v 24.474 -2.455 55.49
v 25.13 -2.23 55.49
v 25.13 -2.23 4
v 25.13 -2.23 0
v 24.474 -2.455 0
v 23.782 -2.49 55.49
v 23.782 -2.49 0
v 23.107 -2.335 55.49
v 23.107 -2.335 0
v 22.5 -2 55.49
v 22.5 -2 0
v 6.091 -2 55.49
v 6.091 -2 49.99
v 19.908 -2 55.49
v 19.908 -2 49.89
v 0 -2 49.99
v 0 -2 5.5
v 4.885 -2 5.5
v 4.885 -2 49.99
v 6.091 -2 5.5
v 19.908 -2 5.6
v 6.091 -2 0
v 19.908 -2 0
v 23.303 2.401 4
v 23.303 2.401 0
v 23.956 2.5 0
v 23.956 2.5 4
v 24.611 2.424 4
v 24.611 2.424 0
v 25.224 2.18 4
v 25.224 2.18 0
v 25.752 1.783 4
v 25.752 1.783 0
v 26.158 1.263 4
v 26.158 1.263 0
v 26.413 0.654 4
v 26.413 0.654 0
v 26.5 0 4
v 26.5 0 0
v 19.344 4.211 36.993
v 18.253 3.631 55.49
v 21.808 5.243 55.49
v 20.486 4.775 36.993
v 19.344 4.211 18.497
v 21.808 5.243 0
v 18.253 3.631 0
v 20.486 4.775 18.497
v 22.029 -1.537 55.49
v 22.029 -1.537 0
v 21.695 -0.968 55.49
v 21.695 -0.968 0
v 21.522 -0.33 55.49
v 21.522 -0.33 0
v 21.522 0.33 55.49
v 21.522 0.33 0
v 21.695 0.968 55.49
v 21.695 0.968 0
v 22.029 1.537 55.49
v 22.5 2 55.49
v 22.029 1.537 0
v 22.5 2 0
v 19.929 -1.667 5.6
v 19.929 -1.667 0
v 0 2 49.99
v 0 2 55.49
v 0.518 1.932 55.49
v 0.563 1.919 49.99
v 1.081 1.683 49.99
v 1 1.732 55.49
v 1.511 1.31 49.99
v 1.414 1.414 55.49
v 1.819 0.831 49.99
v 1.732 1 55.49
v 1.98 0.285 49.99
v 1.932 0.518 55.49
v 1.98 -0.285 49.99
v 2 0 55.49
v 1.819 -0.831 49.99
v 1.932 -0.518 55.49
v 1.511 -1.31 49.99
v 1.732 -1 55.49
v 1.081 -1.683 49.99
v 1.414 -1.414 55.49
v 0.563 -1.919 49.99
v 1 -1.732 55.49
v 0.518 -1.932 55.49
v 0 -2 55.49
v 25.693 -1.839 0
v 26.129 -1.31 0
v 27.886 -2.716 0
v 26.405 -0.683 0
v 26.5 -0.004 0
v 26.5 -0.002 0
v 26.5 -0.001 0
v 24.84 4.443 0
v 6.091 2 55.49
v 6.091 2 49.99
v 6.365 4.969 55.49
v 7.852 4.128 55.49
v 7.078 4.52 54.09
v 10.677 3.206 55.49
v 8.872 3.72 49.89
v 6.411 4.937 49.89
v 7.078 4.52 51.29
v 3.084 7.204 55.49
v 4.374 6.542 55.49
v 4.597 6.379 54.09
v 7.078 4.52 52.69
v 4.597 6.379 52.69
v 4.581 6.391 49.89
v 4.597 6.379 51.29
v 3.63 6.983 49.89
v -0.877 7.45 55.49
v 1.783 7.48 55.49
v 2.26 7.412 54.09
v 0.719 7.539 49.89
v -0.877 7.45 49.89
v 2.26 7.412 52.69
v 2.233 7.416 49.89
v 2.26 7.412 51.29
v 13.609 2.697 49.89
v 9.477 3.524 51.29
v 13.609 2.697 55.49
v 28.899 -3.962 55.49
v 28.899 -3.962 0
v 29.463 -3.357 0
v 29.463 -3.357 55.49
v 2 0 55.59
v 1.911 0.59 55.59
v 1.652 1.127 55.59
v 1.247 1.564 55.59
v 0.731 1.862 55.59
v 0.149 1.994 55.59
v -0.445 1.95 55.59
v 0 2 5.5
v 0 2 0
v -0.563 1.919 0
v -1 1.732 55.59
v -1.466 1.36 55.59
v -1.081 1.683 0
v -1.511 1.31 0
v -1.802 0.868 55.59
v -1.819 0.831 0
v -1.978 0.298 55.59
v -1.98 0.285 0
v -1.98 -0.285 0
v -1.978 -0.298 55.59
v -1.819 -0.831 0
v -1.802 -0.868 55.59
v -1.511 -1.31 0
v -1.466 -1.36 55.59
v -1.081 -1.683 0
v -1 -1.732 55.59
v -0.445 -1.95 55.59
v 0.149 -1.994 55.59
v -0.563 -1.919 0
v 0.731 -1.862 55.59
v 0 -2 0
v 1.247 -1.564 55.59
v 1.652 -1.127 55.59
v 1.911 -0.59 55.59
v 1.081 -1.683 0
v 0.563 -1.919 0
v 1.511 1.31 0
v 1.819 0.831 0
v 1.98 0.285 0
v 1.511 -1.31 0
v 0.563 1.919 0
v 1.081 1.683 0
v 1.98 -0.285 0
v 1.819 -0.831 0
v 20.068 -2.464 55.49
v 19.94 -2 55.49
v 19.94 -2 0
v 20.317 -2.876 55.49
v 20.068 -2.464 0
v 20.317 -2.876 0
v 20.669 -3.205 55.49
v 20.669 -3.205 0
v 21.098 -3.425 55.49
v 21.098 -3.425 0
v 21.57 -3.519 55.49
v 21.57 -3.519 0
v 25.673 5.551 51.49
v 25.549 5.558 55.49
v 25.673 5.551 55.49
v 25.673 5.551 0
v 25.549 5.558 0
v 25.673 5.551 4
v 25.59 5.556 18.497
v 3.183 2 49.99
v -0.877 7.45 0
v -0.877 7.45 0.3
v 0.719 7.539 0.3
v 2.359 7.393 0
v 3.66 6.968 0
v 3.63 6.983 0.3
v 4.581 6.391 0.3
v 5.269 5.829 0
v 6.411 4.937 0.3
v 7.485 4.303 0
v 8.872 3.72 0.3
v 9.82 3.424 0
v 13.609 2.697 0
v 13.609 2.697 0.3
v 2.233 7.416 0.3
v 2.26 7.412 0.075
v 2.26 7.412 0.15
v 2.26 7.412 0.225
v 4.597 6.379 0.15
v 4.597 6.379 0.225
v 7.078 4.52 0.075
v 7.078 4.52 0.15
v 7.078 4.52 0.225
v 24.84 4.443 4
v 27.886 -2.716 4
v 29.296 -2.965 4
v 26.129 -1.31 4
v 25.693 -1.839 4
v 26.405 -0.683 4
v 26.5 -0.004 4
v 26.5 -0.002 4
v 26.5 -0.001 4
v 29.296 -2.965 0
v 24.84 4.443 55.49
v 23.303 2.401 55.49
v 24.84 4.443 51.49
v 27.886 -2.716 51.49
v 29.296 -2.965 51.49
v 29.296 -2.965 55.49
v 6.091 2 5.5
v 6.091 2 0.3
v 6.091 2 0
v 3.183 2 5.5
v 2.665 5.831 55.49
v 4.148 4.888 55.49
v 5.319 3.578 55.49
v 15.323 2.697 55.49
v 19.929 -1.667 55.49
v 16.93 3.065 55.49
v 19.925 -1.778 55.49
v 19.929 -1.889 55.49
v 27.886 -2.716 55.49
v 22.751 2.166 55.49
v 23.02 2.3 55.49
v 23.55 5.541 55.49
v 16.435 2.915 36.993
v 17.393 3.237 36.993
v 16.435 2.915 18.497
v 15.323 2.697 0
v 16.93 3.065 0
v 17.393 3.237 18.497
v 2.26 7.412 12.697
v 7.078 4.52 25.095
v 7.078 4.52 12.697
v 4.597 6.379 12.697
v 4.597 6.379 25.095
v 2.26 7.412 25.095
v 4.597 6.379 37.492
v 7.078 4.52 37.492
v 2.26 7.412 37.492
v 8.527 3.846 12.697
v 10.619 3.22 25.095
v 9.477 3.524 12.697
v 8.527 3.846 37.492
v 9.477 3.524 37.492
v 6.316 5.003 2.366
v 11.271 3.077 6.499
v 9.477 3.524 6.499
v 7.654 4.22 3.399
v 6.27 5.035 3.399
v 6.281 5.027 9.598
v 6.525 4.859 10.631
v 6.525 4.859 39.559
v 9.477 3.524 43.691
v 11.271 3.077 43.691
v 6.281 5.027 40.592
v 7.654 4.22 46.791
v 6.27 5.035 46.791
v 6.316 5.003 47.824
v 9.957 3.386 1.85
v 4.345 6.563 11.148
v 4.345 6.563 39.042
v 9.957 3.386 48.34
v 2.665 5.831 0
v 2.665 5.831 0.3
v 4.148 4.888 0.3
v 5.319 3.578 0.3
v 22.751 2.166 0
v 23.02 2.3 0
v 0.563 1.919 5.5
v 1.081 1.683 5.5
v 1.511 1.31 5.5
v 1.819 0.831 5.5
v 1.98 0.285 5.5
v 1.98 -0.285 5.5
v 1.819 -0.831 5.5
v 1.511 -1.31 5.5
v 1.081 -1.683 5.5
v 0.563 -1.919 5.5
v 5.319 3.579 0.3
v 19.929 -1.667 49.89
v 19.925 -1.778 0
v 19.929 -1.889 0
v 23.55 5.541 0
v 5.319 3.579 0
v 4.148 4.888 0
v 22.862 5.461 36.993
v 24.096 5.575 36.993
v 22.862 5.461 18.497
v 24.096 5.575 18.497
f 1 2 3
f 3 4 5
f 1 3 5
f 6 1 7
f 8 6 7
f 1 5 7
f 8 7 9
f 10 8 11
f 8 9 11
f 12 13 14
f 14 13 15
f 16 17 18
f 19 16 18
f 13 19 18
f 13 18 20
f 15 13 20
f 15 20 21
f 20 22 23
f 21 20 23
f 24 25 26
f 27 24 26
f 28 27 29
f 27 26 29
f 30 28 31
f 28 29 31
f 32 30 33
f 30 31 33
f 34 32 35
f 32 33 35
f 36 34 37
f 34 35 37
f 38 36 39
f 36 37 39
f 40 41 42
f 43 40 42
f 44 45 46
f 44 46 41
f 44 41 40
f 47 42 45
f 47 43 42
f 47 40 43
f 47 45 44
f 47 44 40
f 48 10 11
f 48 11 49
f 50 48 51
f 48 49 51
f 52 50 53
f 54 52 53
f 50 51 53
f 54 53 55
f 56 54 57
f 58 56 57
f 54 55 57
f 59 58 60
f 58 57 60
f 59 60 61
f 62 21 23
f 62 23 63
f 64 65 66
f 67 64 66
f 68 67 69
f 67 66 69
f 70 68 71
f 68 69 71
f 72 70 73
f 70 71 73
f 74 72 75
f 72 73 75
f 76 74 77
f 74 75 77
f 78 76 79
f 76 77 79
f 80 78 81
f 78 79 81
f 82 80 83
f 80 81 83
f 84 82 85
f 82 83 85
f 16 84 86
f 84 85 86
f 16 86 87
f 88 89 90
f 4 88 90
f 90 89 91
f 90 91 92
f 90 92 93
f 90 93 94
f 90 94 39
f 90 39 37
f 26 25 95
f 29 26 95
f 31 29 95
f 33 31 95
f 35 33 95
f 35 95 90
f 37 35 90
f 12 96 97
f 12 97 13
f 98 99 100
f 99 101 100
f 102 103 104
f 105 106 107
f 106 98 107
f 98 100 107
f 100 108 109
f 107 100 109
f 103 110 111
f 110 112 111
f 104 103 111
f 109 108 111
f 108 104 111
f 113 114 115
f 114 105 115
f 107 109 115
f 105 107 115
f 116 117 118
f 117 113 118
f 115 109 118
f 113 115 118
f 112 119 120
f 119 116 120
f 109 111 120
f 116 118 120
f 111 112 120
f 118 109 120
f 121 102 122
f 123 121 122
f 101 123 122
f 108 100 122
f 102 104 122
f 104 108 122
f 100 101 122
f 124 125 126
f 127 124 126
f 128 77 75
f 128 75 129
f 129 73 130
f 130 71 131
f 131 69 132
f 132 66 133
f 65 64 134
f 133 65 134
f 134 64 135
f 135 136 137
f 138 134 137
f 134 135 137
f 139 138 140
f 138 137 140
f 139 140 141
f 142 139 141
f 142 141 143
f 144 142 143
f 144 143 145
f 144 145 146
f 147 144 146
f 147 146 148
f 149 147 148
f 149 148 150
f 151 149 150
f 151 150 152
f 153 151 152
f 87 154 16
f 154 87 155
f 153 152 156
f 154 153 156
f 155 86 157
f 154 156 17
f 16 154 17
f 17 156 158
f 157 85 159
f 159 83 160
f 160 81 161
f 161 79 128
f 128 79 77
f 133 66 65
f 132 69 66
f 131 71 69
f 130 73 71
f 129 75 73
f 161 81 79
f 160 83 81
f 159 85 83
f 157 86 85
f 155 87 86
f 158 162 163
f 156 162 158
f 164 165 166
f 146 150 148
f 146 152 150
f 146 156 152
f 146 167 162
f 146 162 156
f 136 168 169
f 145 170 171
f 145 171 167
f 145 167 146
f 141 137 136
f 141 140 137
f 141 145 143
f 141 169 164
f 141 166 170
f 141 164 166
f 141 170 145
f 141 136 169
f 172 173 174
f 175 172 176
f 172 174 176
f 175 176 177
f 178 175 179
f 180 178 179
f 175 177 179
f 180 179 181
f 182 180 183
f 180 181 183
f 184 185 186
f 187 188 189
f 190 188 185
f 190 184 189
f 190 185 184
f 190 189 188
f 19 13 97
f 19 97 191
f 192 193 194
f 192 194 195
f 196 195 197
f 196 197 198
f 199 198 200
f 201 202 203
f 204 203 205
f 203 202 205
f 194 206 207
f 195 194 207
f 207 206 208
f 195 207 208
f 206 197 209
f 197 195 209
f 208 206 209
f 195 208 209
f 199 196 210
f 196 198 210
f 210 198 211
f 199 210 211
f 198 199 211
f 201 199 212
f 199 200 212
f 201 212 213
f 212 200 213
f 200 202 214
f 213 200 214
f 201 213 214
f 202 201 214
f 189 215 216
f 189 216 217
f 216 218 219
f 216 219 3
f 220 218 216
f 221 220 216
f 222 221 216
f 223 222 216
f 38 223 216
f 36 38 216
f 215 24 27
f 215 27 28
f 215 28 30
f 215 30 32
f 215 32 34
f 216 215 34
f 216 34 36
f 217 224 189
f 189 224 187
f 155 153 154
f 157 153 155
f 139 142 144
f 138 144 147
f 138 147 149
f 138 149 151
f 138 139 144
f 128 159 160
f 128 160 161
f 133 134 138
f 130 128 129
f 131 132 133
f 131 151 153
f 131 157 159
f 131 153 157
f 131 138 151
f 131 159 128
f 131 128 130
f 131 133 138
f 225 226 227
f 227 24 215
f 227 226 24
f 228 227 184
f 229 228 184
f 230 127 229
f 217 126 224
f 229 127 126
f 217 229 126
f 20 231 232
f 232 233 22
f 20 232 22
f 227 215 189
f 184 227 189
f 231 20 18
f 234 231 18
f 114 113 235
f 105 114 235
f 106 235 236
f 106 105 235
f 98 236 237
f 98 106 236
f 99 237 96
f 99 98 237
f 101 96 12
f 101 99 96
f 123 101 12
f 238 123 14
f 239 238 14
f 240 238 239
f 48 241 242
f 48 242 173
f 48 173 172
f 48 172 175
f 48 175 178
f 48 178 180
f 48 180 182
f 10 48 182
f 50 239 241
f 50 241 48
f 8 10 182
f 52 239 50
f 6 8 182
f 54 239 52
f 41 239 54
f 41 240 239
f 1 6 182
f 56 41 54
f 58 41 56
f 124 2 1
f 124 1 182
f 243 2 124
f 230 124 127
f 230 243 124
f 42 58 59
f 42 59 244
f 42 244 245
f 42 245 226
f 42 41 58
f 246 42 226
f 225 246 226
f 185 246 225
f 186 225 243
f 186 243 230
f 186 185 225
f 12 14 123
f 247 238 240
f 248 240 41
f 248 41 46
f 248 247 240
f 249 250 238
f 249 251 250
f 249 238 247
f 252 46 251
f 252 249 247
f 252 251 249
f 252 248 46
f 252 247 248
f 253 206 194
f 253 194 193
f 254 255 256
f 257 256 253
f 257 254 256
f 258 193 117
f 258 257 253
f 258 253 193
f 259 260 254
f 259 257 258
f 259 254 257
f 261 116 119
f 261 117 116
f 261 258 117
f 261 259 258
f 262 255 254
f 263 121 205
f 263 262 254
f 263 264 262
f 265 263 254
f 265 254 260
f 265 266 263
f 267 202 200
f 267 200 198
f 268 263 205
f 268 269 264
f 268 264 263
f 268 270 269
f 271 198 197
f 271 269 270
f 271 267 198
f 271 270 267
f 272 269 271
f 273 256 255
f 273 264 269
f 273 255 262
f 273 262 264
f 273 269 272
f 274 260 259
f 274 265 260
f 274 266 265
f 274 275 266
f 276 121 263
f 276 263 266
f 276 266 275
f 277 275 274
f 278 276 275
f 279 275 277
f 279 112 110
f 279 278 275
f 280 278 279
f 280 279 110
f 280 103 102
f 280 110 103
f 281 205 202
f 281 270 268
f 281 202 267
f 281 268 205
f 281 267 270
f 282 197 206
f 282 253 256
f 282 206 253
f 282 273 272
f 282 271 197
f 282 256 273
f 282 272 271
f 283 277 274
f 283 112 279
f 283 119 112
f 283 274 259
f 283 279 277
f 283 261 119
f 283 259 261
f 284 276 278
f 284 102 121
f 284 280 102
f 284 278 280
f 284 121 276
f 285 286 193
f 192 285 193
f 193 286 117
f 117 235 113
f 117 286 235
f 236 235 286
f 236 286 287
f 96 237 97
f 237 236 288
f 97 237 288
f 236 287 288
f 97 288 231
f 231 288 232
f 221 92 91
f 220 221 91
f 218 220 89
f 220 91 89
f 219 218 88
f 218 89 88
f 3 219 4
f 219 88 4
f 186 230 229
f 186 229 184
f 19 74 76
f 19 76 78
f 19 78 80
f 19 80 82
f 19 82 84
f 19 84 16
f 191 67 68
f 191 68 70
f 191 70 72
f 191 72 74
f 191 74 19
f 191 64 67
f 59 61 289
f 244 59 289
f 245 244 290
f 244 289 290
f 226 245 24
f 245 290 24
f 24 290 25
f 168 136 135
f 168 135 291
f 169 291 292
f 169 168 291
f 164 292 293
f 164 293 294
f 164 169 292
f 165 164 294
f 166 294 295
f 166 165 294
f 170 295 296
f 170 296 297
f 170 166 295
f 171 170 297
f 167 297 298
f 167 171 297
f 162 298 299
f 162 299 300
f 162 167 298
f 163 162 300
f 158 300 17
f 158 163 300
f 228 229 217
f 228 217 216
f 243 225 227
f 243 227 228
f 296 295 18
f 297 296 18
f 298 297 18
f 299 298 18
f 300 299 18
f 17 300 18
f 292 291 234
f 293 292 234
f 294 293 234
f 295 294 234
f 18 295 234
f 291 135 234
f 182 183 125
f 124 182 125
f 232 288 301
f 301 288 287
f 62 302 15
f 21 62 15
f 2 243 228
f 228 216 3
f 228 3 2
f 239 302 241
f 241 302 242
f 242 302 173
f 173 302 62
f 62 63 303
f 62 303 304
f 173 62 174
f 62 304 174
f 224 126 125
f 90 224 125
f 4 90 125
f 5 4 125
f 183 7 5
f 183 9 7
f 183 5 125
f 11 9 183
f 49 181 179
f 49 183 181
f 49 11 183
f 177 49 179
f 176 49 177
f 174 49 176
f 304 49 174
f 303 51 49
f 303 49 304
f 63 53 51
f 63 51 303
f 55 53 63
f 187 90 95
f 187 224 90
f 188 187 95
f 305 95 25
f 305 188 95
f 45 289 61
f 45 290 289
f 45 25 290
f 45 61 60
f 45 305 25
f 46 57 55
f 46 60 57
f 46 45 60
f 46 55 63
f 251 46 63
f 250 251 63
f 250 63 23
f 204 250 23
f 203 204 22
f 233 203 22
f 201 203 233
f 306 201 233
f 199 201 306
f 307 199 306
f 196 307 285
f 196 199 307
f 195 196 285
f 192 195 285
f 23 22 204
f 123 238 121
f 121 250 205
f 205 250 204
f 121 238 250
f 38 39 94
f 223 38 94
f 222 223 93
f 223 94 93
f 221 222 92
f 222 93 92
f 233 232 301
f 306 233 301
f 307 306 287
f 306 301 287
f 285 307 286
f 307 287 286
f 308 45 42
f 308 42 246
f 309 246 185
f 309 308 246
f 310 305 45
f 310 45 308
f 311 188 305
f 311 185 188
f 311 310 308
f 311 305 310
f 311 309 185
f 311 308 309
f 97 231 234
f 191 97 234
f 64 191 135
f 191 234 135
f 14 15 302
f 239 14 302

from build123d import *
from build123d.topology import SkipClean

# Parameters (mm, degrees)
BOSS_EXTRUDE1_DEPTH              = 55.49
BOSS_EXTRUDE5_DEPTH              = 4
BOSS_EXTRUDE6_START              = 51.49
BOSS_EXTRUDE6_DEPTH              = 4
BOSS_EXTRUDE7_START              = 5.6
BOSS_EXTRUDE7_DEPTH              = 44.29
SKETCH1_11_R                     = 2
BOSS_EXTRUDE8_DEPTH              = 55.59
BOSS_EXTRUDE9_DEPTH              = 55.49
BOSS_EXTRUDE10_REACH             = 60.551
SKETCH3_W                        = 44.29
SKETCH3_H                        = 4
BOSS_EXTRUDE11_START             = -49.89
BOSS_EXTRUDE11_DEPTH             = 55.49
CUT_EXTRUDE1_DEPTH               = 55.59
CUT_EXTRUDE1_DEPTH_BACK          = 55.59
BOSS_EXTRUDE12_DEPTH             = 49.59
BOSS_EXTRUDE12_DIRECTION_2_REACH = 60.225
BOSS_EXTRUDE13_DEPTH             = 4
BOSS_EXTRUDE14_START             = 55.49
BOSS_EXTRUDE14_DEPTH             = 4
BOSS_EXTRUDE15_DEPTH             = 0.3
CUT_EXTRUDE2_DEPTH               = 5.5
CUT_EXTRUDE3_START               = 55.49
CUT_EXTRUDE3_DEPTH               = 5.5
BOSS_EXTRUDE16_DEPTH             = 4
CUT_EXTRUDE4_DEPTH               = 5.5
CUT_EXTRUDE5_START               = -55.49
CUT_EXTRUDE5_DEPTH               = 5.5


# Read off the part's stored shape, not the designer's step: Boss-Extrude6
with BuildPart() as part:
    # Sketch1 → Boss-Extrude1 (new body)
    with BuildSketch(Plane.XY):
        with BuildLine():
            ThreePointArc((1.129915274, -2.230087773), (-2.325656227, -0.917236673), (-0.696579505, 2.400995001))
            Line((-0.696579505, 2.400995001), (0.839733193, 4.443342601))
            Line((0.839733193, 4.443342601), (1.672696268, 5.550669345))
            Line((1.672696268, 5.550669345), (-1.620002468, 5.749465478))
            Line((-1.620002468, 5.749465478), (-3.736897473, 3.873630853))
            Line((-3.736897473, 3.873630853), (-4.07142398, -1.667196274))
            ThreePointArc((-4.07142398, -1.667196274), (-3.634366728, -2.93327365), (-2.430068683, -3.519479403))
            Line((-2.430068683, -3.519479403), (4.898910437, -3.961965286))
            Line((4.898910437, -3.961965286), (5.462782558, -3.357258899))
            Line((5.462782558, -3.357258899), (5.295730888, -2.964633462))
            Line((5.295730888, -2.964633462), (3.885857643, -2.716034769))
            Line((3.885857643, -2.716034769), (1.129915274, -2.230087773))
        make_face()
    extrude(amount=BOSS_EXTRUDE1_DEPTH)

    # Sketch1<8> → Boss-Extrude5 (add)
    with BuildSketch(Plane.XY):
        Polygon((1.672696268, 5.550669345), (0.839733193, 4.443342601), (3.885857643, -2.716034769), (5.295730888, -2.964633462), align=None)
    extrude(amount=BOSS_EXTRUDE5_DEPTH)

    # Boss-Extrude6 outline → Boss-Extrude6 (add)
    with BuildSketch(Plane.XY.offset(BOSS_EXTRUDE6_START)):
        Polygon((3.885857643, -2.71603477), (5.295730888, -2.964633462), (1.672696268, 5.550669345), (0.839733193, 4.443342601), align=None)
    extrude(amount=BOSS_EXTRUDE6_DEPTH)


with BuildPart() as body_2:
    # Sketch1<10> → Boss-Extrude7 (new body)
    with BuildSketch(Plane.XY.offset(BOSS_EXTRUDE7_START)):
        with BuildLine():
            Line((0, -2), (12, -2))
            Line((12, -2), (12, 2))
            Line((12, 2), (0, 2))
            ThreePointArc((0, 2), (-2, 0), (0, -2))
        make_face()
    extrude(amount=BOSS_EXTRUDE7_DEPTH)

    # Sketch1<11> → Boss-Extrude8 (add)
    with BuildSketch(Plane.XY):
        Circle(SKETCH1_11_R)
    extrude(amount=BOSS_EXTRUDE8_DEPTH)


with BuildPart() as body_3:
    # Sketch1<12> → Boss-Extrude9 (new body)
    with BuildSketch(Plane.XY):
        with BuildLine():
            Line((22.5, 2), (20.149982379, 2))
            Line((20.149982379, 2), (19.92857602, -1.667196274))
            ThreePointArc((19.92857602, -1.667196274), (19.926466234, -1.833875846), (19.940224749, -2))
            Line((19.940224749, -2), (22.5, -2))
            ThreePointArc((22.5, -2), (21.5, 0), (22.5, 2))
        make_face()
        with BuildLine():
            Line((20.263102527, 3.873630853), (20.149982379, 2))
            Line((20.149982379, 2), (22.5, 2))
            ThreePointArc((22.5, 2), (22.883559394, 2.236863959), (23.303420495, 2.400995001))
            Line((23.303420495, 2.400995001), (24.839733193, 4.443342601))
            Line((24.839733193, 4.443342601), (25.672696268, 5.550669345))
            Line((25.672696268, 5.550669345), (22.379997532, 5.749465478))
            Line((22.379997532, 5.749465478), (20.263102527, 3.873630853))
        make_face()
        with BuildLine():
            Line((22.5, -2), (19.940224749, -2))
            ThreePointArc((19.940224749, -2), (20.482001684, -3.052625751), (21.569931317, -3.519479403))
            Line((21.569931317, -3.519479403), (28.898910437, -3.961965286))
            Line((28.898910437, -3.961965286), (29.462782558, -3.357258899))
            Line((29.462782558, -3.357258899), (29.295730888, -2.964633462))
            Line((29.295730888, -2.964633462), (27.885857643, -2.716034769))
            Line((27.885857643, -2.716034769), (25.129915274, -2.230087773))
            ThreePointArc((25.129915274, -2.230087773), (23.782110643, -2.490486745), (22.5, -2))
        make_face()
    extrude(amount=BOSS_EXTRUDE9_DEPTH)

    # Boss-Extrude10: up to this face of the body (flat: up to its plane)
    boss_extrude10_end = Plane(body_3.part.faces().sort_by_distance((20.095839274, 1.10321729, 27.745))[0])
    # Sketch3 → Boss-Extrude10 (add, up to the picked face)
    with BuildSketch(Plane(origin=(12, 0, 0), x_dir=(0, 0, -1), z_dir=(1, 0, 0)), mode=Mode.PRIVATE) as boss_extrude10_sk1:
        with Locations((-27.745, 0)):
            Rectangle(SKETCH3_W, SKETCH3_H)
    boss_extrude10_tool1 = split(extrude(boss_extrude10_sk1.sketch, amount=BOSS_EXTRUDE10_REACH, mode=Mode.PRIVATE), bisect_by=boss_extrude10_end, keep=Keep.BOTH, mode=Mode.PRIVATE)

    add(body_2.part)  # Boss-Extrude10 merges body 2
    add(boss_extrude10_tool1.solids().sort_by(Axis((12, 0, 27.745), (1, 0, 0)))[0])

    # Sketch4 → Boss-Extrude11 (add)
    with BuildSketch(Plane.XY.offset(49.89).offset(BOSS_EXTRUDE11_START)):
        with BuildLine():
            Line((20.263102527, 3.873630853), (25.672696268, 5.550669345))
            add(Edge.make_bspline(
                [(18.253064845, 3.63105347), (20.126675338, 4.576543011), (21.657010209, 5.806862999), (25.672696268, 5.550669345)],
                knots=[0.306550142, 0.306550142, 0.306550142, 0.306550142, 1, 1, 1, 1], degree=3))
            add(Edge.make_bspline(
                [(15.322676772, 2.697160199), (16.529464831, 2.850779242), (17.424806601, 3.213085323), (18.253064845, 3.63105347)],
                knots=[0, 0, 0, 0, 0.306550142, 0.306550142, 0.306550142, 0.306550142], degree=3))
            Line((15.322676772, 2.697160199), (13.609149986, 2.697160199))
            Line((13.609149986, 2.697160199), (13.609149986, 2))
            Line((13.609149986, 2), (0, 2))
            ThreePointArc((0, 2), (2, 0), (0, -2))
            Line((0, -2), (6.092058814, -2))
            Line((6.092058814, -2), (19.908483051, -2))
            Line((19.908483051, -2), (20.263102527, 3.873630853))
        make_face()
    extrude(amount=BOSS_EXTRUDE11_DEPTH)

    # Sketch4<5> → Cut-Extrude1 (cut, two sides: drawn at the far end of the back side and taken through both)
    with BuildSketch(Plane.XY.offset(49.89).offset(-CUT_EXTRUDE1_DEPTH_BACK)):
        with BuildLine():
            add(Edge.make_bspline(
                [(18.253064845, 3.63105347), (20.126675338, 4.576543011), (21.657010209, 5.806862999), (25.672696268, 5.550669345)],
                knots=[0.306550142, 0.306550142, 0.306550142, 0.306550142, 1, 1, 1, 1], degree=3))
            Line((25.672696268, 5.550669345), (19.033452373, 9.878906939))
            Line((19.033452373, 9.878906939), (18.253064845, 3.63105347))
        make_face()
    extrude(amount=CUT_EXTRUDE1_DEPTH + CUT_EXTRUDE1_DEPTH_BACK, mode=Mode.SUBTRACT)

    # Sketch4<6> → Boss-Extrude12 (add)
    with BuildSketch(Plane.XY.offset(49.89)):
        with BuildLine():
            Line((6.092058814, 2), (13.609149986, 2))
            Line((13.609149986, 2), (13.609149986, 2.697160199))
            add(Edge.make_bspline(
                [(13.609149986, 2.697160199), (3.008937487, 4.043912628), (6.643549935, 7.427073901), (2.231724762, 7.792821065), (-0.877126137, 7.449933099)],
                knots=[0, 0, 0, 0, 0, 1, 1, 1, 1, 1], degree=4))
            Line((-0.877126137, 7.449933099), (2.665214437, 5.830739223))
            ThreePointArc((2.665214437, 5.830739223), (4.778774076, 4.27366426), (6.091049818, 2))
            Line((6.091049818, 2), (6.092058814, 2))
        make_face()
    extrude(amount=-BOSS_EXTRUDE12_DEPTH)

    # Boss-Extrude12 direction 2: up to this face of the body (flat: up to its plane)
    boss_extrude12_direction_2_end = Plane(body_3.part.faces().sort_by_distance((14.730018873, 0.349949508, 55.49))[0])
    # Sketch4<6> → Boss-Extrude12 direction 2 (add, up to the picked face)
    with BuildSketch(Plane.XY.offset(49.89), mode=Mode.PRIVATE) as boss_extrude12_direction_2_sk1:
        with BuildLine():
            Line((6.092058814, 2), (13.609149986, 2))
            Line((13.609149986, 2), (13.609149986, 2.697160199))
            add(Edge.make_bspline(
                [(13.609149986, 2.697160199), (3.008937487, 4.043912628), (6.643549935, 7.427073901), (2.231724762, 7.792821065), (-0.877126137, 7.449933099)],
                knots=[0, 0, 0, 0, 0, 1, 1, 1, 1, 1], degree=4))
            Line((-0.877126137, 7.449933099), (2.665214437, 5.830739223))
            ThreePointArc((2.665214437, 5.830739223), (4.778774076, 4.27366426), (6.091049818, 2))
            Line((6.091049818, 2), (6.092058814, 2))
        make_face()
    boss_extrude12_direction_2_tool1 = split(extrude(boss_extrude12_direction_2_sk1.sketch, amount=BOSS_EXTRUDE12_DIRECTION_2_REACH, mode=Mode.PRIVATE), bisect_by=boss_extrude12_direction_2_end, keep=Keep.BOTH, mode=Mode.PRIVATE)
    add(boss_extrude12_direction_2_tool1.solids().sort_by(Axis((6.524615, 4.223787, 49.89), (0, 0, 1)))[0])

    # Sketch1<13> → Boss-Extrude13 (add)
    with BuildSketch(Plane.XY):
        Polygon((25.672696268, 5.550669345), (24.839733193, 4.443342601), (27.885857643, -2.716034769), (29.295730888, -2.964633462), align=None)
    extrude(amount=BOSS_EXTRUDE13_DEPTH)

    # Sketch1<14> → Boss-Extrude14 (add)
    with BuildSketch(Plane.XY.offset(BOSS_EXTRUDE14_START)):
        Polygon((25.672696268, 5.550669345), (24.839733193, 4.443342601), (27.885857643, -2.716034769), (29.295730888, -2.964633462), align=None)
    extrude(amount=-BOSS_EXTRUDE14_DEPTH)

    # Sketch5 → Boss-Extrude15 (add)
    with BuildSketch(Plane(origin=(0, 0, 0.3), x_dir=(-1, 0, 0), z_dir=(0, 0, -1))):
        with BuildLine():
            Line((-13.609149986, 2), (-6.091302067, 2))
            ThreePointArc((-6.091302067, 2), (-4.778900201, 4.273690642), (-2.665214437, 5.830739223))
            Line((-2.665214437, 5.830739223), (0.877126137, 7.449933099))
            add(Edge.make_bspline(
                [(0.877126137, 7.449933099), (-2.231724762, 7.792821065), (-6.643549935, 7.427073901), (-3.008937487, 4.043912628), (-13.609149986, 2.697160199)],
                knots=[0, 0, 0, 0, 0, 1, 1, 1, 1, 1], degree=4))
            Line((-13.609149986, 2.697160199), (-13.609149986, 2))
        make_face()
    extrude(amount=BOSS_EXTRUDE15_DEPTH)

    # Sketch1<15> → Cut-Extrude2 (cut)
    with SkipClean():  # the faces are left unmerged after this step: merging them gives an invalid solid
        with BuildSketch(Plane.XY):
            with BuildLine():
                Line((0, -2), (4.885305034, -2))
                Line((4.885305034, -2), (3.183411536, 2))
                Line((3.183411536, 2), (0, 2))
                ThreePointArc((0, 2), (2, 0), (0, -2))
            make_face()
        extrude(amount=CUT_EXTRUDE2_DEPTH, mode=Mode.SUBTRACT)

    # Sketch1<16> → Cut-Extrude3 (cut)
    with SkipClean():  # the faces are left unmerged after this step: merging them gives an invalid solid
        with BuildSketch(Plane.XY.offset(CUT_EXTRUDE3_START)):
            with BuildLine():
                Line((0, -2), (4.885305034, -2))
                Line((4.885305034, -2), (3.183411536, 2))
                Line((3.183411536, 2), (0, 2))
                ThreePointArc((0, 2), (2, 0), (0, -2))
            make_face()
        extrude(amount=-CUT_EXTRUDE3_DEPTH, mode=Mode.SUBTRACT)

    # Sketch1<17> → Boss-Extrude16 (add)
    with SkipClean():  # the faces are left unmerged after this step: merging them gives an invalid solid
        with BuildSketch(Plane.XY):
            with BuildLine():
                Line((24.839733193, 4.443342601), (23.303420495, 2.400995001))
                ThreePointArc((23.303420495, 2.400995001), (25.50142453, 1.998930809), (26.5, 0))
                ThreePointArc((26.5, 0), (26.499999366, -0.001781138), (26.499997462, -0.003562276))
                ThreePointArc((26.499997462, -0.003562276), (26.129183075, -1.310182978), (25.129915274, -2.230087773))
                Line((25.129915274, -2.230087773), (27.885857643, -2.716034769))
                Line((27.885857643, -2.716034769), (24.839733193, 4.443342601))
            make_face()
        extrude(amount=BOSS_EXTRUDE16_DEPTH)

    # Sketch6 → Cut-Extrude4 (cut)
    with SkipClean():  # the faces are left unmerged after this step: merging them gives an invalid solid
        with BuildSketch(Plane(origin=(0, 0, 0), x_dir=(-1, 0, 0), z_dir=(0, 0, -1))):
            Polygon((-3.183411536, 2), (-6.091302067, 2), (-6.091302067, -2), (-4.885305034, -2), align=None)
        extrude(amount=-CUT_EXTRUDE4_DEPTH, mode=Mode.SUBTRACT)

    # Sketch6<3> → Cut-Extrude5 (cut)
    with SkipClean():  # the faces are left unmerged after this step: merging them gives an invalid solid
        with BuildSketch(Plane(origin=(0, 0, 0), x_dir=(-1, 0, 0), z_dir=(0, 0, -1)).offset(CUT_EXTRUDE5_START)):
            Polygon((-3.183411536, 2), (-6.091302067, 2), (-6.091302067, -2), (-4.885305034, -2), align=None)
        extrude(amount=CUT_EXTRUDE5_DEPTH, mode=Mode.SUBTRACT)


solid = body_3.part
